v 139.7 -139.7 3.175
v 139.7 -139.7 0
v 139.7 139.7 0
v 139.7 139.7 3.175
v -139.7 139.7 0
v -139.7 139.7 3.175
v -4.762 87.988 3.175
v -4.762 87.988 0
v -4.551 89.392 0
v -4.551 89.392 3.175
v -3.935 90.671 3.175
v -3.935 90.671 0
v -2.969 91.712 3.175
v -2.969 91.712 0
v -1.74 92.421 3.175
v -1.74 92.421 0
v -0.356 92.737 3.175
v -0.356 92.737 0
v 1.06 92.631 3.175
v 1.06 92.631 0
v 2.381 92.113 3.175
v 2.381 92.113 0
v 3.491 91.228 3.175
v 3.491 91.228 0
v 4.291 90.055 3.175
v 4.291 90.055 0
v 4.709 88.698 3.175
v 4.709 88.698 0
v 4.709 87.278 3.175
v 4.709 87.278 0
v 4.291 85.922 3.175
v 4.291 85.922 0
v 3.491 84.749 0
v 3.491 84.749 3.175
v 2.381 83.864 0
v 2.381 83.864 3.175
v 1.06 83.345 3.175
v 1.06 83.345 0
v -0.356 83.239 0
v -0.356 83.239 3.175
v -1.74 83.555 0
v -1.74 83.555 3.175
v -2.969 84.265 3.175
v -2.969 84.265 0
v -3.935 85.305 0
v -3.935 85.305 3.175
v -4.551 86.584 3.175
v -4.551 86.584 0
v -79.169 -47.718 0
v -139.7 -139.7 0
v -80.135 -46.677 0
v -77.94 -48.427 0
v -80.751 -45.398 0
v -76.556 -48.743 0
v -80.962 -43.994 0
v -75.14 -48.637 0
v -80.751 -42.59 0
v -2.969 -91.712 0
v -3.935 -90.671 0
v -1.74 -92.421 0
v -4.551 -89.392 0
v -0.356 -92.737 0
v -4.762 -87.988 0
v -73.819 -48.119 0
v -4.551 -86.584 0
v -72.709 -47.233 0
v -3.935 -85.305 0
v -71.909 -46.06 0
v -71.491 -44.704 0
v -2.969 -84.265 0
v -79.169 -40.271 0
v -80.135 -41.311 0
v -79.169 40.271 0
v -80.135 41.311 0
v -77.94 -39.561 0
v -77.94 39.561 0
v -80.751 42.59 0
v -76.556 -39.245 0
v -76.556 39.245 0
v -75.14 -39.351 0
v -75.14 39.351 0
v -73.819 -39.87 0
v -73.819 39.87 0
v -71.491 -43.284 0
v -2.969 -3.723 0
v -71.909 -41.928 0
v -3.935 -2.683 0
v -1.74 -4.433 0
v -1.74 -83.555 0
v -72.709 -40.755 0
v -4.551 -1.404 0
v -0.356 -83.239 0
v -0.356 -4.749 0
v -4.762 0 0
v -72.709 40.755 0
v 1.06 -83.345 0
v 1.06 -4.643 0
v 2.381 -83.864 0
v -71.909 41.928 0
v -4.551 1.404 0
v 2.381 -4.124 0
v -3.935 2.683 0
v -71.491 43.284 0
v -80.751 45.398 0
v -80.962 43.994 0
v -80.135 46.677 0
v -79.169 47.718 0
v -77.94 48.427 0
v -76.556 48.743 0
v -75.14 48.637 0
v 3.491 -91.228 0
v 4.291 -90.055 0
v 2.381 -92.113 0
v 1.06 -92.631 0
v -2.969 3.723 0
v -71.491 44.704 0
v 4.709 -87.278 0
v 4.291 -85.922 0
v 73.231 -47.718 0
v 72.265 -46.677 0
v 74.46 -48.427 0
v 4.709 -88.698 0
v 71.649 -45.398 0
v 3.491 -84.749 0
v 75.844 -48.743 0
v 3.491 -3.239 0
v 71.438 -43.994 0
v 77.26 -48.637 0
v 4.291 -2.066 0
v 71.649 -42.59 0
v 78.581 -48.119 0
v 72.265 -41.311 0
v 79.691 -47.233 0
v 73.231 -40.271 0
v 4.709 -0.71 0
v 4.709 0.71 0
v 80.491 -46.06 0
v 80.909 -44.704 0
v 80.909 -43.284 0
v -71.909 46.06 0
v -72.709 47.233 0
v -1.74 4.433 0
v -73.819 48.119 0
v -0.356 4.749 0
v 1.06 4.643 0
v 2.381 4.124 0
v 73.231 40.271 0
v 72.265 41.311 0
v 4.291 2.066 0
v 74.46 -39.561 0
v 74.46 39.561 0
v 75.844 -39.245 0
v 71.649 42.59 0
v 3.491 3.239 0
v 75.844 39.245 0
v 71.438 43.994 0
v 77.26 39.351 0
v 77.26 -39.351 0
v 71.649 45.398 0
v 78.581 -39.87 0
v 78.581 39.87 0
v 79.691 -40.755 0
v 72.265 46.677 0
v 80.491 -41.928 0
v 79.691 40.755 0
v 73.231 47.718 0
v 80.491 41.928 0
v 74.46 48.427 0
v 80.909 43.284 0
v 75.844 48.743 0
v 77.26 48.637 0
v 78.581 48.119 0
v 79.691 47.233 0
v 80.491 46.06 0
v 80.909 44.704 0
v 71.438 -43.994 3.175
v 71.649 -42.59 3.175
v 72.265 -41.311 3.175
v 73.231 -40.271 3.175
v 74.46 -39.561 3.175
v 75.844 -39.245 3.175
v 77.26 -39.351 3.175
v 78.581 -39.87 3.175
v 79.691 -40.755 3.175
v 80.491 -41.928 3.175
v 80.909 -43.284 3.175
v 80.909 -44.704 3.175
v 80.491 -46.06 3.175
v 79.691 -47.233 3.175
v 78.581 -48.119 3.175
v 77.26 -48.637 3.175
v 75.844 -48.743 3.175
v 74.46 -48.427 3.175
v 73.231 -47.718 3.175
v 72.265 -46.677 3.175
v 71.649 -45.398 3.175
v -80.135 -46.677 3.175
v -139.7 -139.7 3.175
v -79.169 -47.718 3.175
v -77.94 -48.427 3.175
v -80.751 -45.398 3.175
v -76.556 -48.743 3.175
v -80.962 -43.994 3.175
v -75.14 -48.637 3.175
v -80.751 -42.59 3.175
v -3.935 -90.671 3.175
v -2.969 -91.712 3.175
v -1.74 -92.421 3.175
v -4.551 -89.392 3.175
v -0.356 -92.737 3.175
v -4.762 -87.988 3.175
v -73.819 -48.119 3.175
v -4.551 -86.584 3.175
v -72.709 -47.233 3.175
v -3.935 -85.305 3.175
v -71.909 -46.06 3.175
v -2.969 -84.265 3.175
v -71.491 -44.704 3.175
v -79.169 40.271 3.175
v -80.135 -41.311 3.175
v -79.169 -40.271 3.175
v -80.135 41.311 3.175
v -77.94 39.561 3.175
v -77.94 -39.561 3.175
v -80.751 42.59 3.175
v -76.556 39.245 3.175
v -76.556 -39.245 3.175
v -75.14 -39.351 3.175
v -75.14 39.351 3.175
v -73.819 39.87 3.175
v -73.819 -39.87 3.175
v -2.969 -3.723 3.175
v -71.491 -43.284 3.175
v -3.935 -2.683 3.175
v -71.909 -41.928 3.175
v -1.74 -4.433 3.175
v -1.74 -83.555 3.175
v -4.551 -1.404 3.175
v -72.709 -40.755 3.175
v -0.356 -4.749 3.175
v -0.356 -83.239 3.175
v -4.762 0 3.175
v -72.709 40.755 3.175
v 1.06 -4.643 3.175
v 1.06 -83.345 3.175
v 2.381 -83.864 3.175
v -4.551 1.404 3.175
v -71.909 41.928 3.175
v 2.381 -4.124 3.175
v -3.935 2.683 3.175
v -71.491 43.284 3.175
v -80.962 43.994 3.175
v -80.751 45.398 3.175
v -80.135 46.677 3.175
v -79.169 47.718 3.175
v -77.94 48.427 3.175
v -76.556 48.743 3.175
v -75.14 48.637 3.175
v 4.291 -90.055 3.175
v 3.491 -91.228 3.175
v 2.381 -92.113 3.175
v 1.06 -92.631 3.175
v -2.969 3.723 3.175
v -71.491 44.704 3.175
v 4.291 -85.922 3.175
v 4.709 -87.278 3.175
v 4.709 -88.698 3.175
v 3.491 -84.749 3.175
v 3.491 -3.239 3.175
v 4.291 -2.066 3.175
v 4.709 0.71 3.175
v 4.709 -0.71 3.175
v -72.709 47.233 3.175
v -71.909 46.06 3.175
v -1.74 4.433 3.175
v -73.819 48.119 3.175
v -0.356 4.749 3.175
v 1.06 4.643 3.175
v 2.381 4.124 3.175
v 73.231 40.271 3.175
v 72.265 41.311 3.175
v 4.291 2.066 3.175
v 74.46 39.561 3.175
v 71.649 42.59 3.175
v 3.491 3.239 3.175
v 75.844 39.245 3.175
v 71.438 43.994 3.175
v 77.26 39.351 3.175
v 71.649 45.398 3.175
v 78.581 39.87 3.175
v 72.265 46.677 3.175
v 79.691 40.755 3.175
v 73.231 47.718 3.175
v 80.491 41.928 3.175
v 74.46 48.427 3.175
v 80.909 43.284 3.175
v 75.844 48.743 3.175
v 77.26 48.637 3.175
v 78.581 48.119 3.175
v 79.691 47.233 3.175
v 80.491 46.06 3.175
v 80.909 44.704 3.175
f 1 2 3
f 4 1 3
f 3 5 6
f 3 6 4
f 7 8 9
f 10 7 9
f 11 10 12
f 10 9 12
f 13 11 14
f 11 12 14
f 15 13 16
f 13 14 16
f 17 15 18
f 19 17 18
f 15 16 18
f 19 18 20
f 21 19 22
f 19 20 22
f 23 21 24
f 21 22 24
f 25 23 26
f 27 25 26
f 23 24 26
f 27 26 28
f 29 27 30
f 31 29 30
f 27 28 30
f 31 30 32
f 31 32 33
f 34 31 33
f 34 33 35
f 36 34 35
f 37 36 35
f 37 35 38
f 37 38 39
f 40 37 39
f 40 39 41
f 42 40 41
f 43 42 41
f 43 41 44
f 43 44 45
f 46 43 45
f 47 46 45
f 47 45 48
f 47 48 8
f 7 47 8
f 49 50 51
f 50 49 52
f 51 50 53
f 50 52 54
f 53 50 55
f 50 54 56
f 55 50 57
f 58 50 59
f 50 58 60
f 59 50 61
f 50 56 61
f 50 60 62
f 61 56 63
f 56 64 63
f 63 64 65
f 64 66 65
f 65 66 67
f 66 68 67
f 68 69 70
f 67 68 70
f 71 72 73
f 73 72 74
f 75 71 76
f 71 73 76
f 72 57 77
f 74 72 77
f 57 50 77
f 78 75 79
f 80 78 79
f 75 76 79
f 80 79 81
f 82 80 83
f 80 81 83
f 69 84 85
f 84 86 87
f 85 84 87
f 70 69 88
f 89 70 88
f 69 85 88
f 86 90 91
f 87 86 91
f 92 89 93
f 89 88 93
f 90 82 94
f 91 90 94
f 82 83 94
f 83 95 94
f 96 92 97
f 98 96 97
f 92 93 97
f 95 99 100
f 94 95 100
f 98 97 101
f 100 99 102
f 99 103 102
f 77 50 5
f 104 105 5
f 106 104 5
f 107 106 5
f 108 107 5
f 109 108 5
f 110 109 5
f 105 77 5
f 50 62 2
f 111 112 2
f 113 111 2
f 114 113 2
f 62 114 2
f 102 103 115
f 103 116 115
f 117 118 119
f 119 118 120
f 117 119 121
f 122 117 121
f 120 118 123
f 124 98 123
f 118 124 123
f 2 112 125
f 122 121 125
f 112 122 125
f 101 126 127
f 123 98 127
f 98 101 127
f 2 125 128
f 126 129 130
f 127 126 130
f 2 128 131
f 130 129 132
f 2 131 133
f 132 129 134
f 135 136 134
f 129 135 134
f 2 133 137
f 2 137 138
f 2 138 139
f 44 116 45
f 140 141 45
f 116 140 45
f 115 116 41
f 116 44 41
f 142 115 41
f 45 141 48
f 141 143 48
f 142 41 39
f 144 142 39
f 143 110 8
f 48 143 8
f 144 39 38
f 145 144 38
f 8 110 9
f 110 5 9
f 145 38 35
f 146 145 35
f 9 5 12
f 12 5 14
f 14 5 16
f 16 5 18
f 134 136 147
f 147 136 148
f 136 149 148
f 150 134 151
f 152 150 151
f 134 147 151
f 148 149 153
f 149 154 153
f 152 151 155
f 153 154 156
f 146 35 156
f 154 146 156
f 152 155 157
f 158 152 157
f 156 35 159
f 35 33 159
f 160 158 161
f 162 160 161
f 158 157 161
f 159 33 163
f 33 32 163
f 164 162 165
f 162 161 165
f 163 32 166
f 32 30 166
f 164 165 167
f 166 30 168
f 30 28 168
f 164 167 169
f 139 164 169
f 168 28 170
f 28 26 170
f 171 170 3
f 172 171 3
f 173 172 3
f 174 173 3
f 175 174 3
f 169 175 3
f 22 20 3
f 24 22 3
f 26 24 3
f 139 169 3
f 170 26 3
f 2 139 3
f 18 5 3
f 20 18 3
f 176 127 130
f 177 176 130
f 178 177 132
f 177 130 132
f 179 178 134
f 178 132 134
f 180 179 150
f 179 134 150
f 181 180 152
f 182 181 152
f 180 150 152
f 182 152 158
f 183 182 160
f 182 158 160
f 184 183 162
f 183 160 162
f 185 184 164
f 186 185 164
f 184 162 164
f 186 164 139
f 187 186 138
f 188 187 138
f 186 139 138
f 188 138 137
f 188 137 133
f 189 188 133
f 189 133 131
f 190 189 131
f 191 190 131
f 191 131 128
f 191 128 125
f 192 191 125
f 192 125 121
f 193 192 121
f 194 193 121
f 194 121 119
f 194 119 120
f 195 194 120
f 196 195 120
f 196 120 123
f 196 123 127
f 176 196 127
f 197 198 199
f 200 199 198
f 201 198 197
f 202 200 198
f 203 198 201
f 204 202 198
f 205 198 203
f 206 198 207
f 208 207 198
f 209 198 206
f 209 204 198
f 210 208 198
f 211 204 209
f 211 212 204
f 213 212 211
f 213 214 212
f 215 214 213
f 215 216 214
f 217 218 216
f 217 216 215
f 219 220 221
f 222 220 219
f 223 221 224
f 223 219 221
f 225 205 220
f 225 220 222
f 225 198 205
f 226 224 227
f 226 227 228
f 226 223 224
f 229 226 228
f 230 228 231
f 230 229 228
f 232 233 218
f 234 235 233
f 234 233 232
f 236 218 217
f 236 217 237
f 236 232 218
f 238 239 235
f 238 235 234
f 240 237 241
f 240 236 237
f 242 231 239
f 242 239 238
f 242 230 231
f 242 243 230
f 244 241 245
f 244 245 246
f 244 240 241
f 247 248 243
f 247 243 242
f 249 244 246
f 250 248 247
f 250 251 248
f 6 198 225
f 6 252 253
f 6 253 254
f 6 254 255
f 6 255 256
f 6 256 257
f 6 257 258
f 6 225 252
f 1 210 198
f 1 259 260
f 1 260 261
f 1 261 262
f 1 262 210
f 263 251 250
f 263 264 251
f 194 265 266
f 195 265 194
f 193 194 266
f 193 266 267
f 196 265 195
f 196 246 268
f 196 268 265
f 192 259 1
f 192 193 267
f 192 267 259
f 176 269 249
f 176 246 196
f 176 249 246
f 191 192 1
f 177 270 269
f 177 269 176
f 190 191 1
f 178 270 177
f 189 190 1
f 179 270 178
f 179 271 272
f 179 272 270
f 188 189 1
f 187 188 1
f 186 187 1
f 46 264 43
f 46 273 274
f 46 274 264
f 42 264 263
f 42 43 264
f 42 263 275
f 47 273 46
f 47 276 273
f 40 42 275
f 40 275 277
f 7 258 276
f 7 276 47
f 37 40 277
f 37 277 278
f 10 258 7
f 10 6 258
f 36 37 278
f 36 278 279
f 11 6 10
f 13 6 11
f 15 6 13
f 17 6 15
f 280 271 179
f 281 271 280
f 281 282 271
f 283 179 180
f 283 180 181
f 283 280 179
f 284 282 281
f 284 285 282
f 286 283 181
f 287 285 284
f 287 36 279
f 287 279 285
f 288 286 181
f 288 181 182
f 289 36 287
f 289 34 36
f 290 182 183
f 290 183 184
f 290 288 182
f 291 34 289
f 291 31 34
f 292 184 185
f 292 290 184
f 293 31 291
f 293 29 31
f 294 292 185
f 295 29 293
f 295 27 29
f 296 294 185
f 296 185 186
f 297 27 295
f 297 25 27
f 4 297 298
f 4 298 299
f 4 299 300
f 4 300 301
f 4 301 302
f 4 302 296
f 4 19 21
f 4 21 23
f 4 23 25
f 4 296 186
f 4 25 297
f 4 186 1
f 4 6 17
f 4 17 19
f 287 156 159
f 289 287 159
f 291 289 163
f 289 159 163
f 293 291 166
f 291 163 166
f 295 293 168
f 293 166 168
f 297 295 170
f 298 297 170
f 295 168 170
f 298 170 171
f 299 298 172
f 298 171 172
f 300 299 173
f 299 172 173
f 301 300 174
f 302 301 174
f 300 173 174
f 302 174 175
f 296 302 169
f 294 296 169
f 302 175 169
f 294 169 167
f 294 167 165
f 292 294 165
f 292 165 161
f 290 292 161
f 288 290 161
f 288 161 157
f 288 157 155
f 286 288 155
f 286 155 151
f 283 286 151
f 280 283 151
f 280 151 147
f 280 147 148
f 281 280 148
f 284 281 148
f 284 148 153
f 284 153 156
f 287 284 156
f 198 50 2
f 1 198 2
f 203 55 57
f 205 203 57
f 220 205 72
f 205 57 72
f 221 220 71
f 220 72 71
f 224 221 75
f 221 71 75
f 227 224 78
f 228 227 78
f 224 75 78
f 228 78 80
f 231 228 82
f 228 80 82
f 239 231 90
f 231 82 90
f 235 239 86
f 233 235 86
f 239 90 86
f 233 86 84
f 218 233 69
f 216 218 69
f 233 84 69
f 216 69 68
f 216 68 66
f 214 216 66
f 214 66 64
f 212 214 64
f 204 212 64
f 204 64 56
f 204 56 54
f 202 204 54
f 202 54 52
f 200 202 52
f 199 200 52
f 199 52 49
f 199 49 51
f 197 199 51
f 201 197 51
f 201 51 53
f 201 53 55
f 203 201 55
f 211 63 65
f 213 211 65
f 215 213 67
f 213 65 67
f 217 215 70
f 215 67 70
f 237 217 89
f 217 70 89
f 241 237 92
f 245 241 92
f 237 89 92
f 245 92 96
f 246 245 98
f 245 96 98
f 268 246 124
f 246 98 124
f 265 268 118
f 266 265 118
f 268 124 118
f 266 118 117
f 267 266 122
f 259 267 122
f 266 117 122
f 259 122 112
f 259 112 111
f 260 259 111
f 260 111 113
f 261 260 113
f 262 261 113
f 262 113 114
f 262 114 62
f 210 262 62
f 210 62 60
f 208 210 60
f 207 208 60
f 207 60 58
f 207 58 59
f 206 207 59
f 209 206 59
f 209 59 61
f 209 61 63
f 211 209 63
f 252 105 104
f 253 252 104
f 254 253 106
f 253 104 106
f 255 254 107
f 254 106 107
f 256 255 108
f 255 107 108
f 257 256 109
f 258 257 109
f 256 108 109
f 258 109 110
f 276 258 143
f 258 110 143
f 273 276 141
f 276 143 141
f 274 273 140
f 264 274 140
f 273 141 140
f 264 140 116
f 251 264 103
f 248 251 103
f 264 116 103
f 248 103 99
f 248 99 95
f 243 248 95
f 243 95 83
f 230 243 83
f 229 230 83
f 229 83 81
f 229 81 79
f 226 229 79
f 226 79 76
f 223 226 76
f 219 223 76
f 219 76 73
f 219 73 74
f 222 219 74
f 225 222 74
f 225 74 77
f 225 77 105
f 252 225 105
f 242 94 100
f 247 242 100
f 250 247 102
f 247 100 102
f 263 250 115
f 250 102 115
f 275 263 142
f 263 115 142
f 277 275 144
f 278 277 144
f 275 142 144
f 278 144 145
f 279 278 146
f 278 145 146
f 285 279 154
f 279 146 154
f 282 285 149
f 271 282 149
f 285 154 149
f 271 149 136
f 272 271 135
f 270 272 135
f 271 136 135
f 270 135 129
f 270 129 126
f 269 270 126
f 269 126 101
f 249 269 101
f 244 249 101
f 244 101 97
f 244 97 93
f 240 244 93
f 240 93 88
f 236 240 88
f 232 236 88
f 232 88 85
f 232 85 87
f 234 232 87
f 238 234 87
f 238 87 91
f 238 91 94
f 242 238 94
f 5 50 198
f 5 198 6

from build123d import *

# Parameters (mm, degrees)
F0_W     = 279.4
F0_H     = 279.4
F1_DEPTH = 3.175
F3_D     = 9.525


# Not quite as in the source:
# - a length typed as a fraction of an inch, garbled in the dataset ("3 / 203.2 mm" for 3/8 in), is restored


with BuildPart() as f1:
    # F0 (on Top) → F1 (new body)
    with BuildSketch(Plane.XY):
        Rectangle(F0_W, F0_H)
    extrude(amount=F1_DEPTH)

    # F3 (through all)
    with Locations(Plane.XY.offset(3.175)):
        with Locations((0, 87.9881810245), (76.2, 43.9940905122), (76.2, -43.9940905122), (0, -87.9881810245), (-76.2, -43.9940905122), (-76.2, 43.9940905122), (0, 0)):
            Hole(F3_D / 2)


solid = f1.part
